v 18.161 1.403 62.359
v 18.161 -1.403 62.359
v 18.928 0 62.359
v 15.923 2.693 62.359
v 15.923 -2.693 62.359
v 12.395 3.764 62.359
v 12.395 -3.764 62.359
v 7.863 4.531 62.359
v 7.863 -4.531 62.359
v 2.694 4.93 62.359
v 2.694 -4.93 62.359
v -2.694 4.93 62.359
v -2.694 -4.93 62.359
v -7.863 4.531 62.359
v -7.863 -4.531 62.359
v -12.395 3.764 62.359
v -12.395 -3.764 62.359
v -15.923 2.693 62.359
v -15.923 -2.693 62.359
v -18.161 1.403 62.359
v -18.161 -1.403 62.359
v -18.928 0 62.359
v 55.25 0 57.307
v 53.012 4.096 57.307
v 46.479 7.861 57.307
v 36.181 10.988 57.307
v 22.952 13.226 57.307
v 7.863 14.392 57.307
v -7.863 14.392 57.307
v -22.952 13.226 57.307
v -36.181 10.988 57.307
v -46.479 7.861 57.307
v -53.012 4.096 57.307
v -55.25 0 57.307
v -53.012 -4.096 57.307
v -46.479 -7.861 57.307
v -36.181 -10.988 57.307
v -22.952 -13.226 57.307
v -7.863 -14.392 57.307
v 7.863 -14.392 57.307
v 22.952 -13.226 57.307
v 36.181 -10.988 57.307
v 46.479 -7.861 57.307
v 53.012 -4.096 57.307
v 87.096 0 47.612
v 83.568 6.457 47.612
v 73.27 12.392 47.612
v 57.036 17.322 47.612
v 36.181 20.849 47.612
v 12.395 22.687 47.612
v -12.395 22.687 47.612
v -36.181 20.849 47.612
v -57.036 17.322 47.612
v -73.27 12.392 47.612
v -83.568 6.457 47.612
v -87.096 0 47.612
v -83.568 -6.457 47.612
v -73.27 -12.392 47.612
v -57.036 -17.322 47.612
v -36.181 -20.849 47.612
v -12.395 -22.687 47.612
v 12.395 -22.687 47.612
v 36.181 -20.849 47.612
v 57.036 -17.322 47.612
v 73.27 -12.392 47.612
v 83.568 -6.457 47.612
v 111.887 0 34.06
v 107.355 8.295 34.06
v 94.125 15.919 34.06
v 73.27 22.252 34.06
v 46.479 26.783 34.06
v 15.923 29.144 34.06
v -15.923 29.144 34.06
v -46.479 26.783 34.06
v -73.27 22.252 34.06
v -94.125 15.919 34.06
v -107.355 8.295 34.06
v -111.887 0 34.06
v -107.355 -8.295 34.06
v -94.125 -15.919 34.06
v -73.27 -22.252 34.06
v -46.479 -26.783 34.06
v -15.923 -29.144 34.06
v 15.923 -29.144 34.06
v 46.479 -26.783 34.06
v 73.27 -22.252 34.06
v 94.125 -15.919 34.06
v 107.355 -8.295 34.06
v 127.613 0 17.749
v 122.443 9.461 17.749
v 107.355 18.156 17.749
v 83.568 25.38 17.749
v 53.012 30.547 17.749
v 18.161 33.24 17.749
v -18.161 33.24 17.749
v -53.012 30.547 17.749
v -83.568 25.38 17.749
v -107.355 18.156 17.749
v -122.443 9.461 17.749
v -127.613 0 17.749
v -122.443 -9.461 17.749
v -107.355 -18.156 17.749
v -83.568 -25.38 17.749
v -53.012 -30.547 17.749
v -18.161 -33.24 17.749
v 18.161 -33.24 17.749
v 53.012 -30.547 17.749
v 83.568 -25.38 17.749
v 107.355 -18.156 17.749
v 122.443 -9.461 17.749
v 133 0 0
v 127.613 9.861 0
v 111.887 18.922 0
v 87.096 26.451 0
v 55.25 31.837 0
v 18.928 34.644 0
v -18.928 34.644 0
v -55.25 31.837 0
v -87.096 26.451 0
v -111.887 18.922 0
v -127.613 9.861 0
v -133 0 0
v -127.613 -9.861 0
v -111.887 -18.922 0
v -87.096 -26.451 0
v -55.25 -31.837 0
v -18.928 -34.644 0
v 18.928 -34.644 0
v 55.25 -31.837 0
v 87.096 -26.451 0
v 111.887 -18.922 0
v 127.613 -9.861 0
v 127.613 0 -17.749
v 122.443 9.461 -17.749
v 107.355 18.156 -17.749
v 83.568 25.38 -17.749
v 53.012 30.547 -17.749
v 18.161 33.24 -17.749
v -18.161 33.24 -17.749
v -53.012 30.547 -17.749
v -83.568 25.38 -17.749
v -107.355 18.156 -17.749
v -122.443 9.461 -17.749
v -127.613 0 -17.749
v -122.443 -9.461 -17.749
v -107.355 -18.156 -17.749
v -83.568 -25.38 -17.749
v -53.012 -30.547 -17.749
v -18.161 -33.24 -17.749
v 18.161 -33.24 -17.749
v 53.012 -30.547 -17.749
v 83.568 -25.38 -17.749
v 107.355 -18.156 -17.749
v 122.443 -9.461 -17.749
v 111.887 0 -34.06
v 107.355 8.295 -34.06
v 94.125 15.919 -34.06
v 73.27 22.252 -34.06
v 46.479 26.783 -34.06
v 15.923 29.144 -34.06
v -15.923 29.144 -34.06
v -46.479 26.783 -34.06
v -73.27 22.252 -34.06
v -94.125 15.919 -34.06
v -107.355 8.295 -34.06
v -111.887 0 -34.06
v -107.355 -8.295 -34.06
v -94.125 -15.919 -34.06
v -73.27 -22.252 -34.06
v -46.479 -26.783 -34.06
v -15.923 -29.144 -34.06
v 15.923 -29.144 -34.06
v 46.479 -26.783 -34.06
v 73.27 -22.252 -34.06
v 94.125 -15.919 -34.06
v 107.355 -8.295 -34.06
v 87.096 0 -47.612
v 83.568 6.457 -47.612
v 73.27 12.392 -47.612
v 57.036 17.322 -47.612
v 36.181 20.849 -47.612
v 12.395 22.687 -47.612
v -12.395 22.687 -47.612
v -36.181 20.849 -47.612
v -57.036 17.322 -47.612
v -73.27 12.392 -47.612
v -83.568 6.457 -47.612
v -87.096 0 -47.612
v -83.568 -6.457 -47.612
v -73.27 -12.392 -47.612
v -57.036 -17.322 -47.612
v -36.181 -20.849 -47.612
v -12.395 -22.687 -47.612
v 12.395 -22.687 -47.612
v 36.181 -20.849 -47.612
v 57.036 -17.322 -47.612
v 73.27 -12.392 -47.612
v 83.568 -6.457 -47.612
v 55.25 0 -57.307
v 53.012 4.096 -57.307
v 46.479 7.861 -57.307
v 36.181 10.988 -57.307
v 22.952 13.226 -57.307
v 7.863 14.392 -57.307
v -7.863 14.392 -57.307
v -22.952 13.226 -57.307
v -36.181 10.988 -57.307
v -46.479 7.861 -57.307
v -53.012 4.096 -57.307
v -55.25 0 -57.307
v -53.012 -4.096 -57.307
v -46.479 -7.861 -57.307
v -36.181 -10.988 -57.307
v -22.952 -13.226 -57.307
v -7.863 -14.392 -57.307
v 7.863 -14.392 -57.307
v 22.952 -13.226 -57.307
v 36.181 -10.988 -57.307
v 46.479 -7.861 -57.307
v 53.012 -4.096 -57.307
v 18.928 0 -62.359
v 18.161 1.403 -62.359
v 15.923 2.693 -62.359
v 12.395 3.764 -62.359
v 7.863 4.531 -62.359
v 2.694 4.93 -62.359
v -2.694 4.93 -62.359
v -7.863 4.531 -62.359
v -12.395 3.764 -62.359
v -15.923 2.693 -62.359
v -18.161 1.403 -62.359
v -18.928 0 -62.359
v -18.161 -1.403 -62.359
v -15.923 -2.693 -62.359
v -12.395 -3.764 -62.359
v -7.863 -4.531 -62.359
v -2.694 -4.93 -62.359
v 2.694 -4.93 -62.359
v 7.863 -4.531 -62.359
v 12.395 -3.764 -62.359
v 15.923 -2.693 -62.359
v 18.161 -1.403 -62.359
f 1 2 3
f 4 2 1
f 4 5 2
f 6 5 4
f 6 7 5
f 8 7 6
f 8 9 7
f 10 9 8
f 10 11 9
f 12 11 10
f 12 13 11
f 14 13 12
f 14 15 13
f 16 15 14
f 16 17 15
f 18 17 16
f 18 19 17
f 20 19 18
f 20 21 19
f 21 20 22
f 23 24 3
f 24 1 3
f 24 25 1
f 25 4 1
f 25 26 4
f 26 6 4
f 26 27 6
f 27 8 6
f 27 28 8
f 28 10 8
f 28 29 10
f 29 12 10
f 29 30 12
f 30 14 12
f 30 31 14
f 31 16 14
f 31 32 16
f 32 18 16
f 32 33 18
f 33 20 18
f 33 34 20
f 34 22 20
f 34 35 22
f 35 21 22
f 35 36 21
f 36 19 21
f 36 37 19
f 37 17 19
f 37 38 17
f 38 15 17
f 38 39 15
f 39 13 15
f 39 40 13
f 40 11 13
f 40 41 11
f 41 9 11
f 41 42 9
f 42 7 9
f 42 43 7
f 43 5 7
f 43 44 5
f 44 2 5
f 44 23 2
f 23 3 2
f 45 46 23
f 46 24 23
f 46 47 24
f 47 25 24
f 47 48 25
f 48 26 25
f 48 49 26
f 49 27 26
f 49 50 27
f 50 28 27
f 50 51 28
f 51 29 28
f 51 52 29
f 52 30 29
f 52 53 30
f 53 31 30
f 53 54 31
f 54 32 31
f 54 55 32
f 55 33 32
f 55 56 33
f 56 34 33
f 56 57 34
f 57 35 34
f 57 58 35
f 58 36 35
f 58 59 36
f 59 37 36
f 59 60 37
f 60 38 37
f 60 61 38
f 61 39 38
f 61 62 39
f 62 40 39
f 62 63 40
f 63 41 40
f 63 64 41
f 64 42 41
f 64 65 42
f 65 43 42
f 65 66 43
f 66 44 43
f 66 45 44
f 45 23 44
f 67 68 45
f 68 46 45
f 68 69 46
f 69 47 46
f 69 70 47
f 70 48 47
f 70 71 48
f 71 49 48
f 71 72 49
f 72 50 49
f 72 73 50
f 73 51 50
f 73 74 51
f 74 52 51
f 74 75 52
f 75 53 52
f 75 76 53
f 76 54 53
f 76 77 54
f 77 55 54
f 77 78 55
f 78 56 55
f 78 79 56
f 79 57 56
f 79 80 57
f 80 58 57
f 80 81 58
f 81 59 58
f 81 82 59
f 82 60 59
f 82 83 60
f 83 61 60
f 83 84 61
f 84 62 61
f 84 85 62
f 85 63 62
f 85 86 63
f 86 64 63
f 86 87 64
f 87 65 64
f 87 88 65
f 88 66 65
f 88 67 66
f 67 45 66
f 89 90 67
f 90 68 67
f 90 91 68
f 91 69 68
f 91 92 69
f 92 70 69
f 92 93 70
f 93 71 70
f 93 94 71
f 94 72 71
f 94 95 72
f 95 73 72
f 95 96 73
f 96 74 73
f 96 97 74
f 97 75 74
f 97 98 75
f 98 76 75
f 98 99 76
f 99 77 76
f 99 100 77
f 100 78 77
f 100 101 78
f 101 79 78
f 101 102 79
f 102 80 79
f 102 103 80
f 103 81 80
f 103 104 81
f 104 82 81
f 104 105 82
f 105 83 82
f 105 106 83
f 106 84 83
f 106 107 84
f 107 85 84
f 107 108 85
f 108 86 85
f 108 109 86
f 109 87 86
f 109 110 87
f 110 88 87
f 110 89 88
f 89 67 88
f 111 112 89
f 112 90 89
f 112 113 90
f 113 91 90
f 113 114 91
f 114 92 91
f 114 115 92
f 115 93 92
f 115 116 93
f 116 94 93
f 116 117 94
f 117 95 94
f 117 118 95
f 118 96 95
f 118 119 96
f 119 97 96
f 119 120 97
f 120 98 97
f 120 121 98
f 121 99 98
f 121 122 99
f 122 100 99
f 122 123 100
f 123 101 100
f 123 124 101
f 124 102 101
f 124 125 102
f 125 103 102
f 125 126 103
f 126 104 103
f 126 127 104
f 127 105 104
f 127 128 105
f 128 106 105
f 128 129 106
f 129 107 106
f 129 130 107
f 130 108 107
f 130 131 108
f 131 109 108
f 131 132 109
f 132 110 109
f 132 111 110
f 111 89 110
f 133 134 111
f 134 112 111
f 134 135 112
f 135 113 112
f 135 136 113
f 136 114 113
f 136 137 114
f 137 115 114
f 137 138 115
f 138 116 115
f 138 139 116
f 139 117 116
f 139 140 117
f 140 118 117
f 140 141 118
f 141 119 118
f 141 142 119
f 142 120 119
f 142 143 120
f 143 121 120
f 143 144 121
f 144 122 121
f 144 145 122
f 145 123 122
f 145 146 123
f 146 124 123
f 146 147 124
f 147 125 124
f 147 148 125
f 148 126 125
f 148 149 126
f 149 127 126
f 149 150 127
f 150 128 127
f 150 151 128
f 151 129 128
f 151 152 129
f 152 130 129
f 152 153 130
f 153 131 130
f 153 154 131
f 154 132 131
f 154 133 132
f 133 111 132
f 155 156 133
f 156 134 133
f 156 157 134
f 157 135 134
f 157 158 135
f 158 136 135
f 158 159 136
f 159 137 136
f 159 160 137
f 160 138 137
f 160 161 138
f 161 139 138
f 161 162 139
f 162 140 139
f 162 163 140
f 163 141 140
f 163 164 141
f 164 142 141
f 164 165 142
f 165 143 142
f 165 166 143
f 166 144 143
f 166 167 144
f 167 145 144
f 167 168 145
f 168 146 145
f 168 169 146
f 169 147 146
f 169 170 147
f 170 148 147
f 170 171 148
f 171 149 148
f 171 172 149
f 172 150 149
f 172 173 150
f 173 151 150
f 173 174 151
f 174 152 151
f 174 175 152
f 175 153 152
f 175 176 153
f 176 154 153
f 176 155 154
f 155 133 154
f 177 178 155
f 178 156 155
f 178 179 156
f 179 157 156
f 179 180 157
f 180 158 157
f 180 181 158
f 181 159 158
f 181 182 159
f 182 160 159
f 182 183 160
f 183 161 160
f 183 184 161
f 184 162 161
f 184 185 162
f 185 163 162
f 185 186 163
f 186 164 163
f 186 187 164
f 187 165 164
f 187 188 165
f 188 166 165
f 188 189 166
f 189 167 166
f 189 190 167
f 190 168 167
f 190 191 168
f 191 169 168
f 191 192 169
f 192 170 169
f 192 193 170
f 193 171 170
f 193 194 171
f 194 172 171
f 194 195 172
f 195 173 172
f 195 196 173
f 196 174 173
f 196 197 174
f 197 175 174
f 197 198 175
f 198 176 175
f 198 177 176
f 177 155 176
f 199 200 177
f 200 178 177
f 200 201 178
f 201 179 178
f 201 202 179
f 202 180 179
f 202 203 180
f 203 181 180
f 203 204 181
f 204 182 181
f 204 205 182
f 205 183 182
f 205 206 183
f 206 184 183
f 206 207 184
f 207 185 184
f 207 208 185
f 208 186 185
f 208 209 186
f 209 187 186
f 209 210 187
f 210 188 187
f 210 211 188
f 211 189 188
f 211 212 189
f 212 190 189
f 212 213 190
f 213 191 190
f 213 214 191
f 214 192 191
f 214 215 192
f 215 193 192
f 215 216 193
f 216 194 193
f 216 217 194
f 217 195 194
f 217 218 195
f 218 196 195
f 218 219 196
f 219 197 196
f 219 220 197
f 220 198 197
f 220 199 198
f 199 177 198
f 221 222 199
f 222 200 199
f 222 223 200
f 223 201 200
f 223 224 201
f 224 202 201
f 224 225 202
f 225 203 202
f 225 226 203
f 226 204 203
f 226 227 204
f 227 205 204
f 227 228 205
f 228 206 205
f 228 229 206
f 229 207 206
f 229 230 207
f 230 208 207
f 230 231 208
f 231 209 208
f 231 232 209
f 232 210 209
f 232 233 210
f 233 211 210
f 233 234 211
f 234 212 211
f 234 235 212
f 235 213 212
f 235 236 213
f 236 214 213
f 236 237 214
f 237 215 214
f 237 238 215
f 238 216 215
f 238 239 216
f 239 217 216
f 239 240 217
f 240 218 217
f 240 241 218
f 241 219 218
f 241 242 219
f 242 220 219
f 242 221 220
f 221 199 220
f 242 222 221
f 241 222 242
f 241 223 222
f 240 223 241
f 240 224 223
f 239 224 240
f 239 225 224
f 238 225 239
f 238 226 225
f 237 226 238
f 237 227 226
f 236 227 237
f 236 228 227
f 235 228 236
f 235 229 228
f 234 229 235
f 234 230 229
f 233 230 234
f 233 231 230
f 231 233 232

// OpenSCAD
// Generated by SolidPython 1.0.1 on 2020-07-29 00:46:53


scale(v = [19, 5, 9]) {
	sphere(r = 7);
}
/***********************************************
*********      SolidPython code:      **********
************************************************
 
# import packages: SolidPython
from solid import *
from solid.utils import *
from itertools import chain, combinations, permutations


class Resize:

    def __init__(self, scad_file):
        self.scad_file = scad_file
        #self.scad_file = import_scad(scad_file)
        # cone/cylinder param:
        self.r1 = 0
        self.r2 = 0
        self.h = 0
        # rectangular prism param:
        self.w = 0
        self.l = 0
        # ellipse param:
        self.r = 0

    # import OpenScad code (file name corresponds to shape)


    # classify shape + parameters
    def assign(self, param1, param2, param3):
        if self.scad_file == 'cone.scad':
            self.r1 = param1
            self.r2 = param2
            self.h = param3
        elif self.scad_file == 'cylinder.scad':
            self.r1 = param1
            self.r2 = param2
            self.h = param3
        elif self.scad_file == 'rectangularPrism.scad':
            self.h = param1
            self.l = param2
            self.w = param3
        else:
            self.r = param1
            self.h = param2

    # resize parameters
    def iterate(self):
        x = range(3, 20, 2)
        i = 1
        if self.scad_file == 'cone.scad':
            tempList = list(permutations(x, 2))
            for temp in tempList:
                param1 = temp[0]
                param2 = temp[1]
                filepath = 'produced_scad_files/' + 'cone' + str(param1) + '_' + str(param2) + '_' + '.scad'
                scad_render_to_file(cylinder(h=param1, r1=param2, r2=0), filepath)

        elif self.scad_file == 'cylinder.scad':
            tempList = list(permutations(x, 3))
            for temp in tempList:
                param1 = temp[0]
                param2 = temp[1]
                filepath = 'produced_scad_files/' + 'cylinder' + str(param1) + '_' + str(param2) + '_' + '.scad'
                scad_render_to_file(cylinder(h=param1, r1=param2, r2=param2), filepath)

        elif self.scad_file == 'rectangularPrism.scad':
            tempList = list(permutations(x, 3))
            for temp in tempList:
                param1 = temp[0]
                param2 = temp[1]
                param3 = temp[2]
                filepath = 'produced_scad_files/' + 'rectangularPrism' + str(param1) + '_' + str(param2) + '_' + str(
                    param3) + '.scad'
                scad_render_to_file(cube(size=(param1, param2, param3)), filepath)

        elif self.scad_file == 'ellipse.scad':
            tempList = list(permutations(x, 4))
            for temp in tempList:
                param1 = temp[0]
                param2 = temp[1]
                param3 = temp[2]
                param4 = temp[3]
                filepath = 'produced_scad_files/' + 'ellipse' + str(param1) + '_' + str(param2) + '_' + str(param3) + '_' + str(param4) + '.scad'
                scad_render_to_file(scale([param1, param2, param3])(sphere(r=param4)), filepath)

    def render_to_scadfile(self):
        scad_render_to_file(scad, 'example.scad') 
 
************************************************/
